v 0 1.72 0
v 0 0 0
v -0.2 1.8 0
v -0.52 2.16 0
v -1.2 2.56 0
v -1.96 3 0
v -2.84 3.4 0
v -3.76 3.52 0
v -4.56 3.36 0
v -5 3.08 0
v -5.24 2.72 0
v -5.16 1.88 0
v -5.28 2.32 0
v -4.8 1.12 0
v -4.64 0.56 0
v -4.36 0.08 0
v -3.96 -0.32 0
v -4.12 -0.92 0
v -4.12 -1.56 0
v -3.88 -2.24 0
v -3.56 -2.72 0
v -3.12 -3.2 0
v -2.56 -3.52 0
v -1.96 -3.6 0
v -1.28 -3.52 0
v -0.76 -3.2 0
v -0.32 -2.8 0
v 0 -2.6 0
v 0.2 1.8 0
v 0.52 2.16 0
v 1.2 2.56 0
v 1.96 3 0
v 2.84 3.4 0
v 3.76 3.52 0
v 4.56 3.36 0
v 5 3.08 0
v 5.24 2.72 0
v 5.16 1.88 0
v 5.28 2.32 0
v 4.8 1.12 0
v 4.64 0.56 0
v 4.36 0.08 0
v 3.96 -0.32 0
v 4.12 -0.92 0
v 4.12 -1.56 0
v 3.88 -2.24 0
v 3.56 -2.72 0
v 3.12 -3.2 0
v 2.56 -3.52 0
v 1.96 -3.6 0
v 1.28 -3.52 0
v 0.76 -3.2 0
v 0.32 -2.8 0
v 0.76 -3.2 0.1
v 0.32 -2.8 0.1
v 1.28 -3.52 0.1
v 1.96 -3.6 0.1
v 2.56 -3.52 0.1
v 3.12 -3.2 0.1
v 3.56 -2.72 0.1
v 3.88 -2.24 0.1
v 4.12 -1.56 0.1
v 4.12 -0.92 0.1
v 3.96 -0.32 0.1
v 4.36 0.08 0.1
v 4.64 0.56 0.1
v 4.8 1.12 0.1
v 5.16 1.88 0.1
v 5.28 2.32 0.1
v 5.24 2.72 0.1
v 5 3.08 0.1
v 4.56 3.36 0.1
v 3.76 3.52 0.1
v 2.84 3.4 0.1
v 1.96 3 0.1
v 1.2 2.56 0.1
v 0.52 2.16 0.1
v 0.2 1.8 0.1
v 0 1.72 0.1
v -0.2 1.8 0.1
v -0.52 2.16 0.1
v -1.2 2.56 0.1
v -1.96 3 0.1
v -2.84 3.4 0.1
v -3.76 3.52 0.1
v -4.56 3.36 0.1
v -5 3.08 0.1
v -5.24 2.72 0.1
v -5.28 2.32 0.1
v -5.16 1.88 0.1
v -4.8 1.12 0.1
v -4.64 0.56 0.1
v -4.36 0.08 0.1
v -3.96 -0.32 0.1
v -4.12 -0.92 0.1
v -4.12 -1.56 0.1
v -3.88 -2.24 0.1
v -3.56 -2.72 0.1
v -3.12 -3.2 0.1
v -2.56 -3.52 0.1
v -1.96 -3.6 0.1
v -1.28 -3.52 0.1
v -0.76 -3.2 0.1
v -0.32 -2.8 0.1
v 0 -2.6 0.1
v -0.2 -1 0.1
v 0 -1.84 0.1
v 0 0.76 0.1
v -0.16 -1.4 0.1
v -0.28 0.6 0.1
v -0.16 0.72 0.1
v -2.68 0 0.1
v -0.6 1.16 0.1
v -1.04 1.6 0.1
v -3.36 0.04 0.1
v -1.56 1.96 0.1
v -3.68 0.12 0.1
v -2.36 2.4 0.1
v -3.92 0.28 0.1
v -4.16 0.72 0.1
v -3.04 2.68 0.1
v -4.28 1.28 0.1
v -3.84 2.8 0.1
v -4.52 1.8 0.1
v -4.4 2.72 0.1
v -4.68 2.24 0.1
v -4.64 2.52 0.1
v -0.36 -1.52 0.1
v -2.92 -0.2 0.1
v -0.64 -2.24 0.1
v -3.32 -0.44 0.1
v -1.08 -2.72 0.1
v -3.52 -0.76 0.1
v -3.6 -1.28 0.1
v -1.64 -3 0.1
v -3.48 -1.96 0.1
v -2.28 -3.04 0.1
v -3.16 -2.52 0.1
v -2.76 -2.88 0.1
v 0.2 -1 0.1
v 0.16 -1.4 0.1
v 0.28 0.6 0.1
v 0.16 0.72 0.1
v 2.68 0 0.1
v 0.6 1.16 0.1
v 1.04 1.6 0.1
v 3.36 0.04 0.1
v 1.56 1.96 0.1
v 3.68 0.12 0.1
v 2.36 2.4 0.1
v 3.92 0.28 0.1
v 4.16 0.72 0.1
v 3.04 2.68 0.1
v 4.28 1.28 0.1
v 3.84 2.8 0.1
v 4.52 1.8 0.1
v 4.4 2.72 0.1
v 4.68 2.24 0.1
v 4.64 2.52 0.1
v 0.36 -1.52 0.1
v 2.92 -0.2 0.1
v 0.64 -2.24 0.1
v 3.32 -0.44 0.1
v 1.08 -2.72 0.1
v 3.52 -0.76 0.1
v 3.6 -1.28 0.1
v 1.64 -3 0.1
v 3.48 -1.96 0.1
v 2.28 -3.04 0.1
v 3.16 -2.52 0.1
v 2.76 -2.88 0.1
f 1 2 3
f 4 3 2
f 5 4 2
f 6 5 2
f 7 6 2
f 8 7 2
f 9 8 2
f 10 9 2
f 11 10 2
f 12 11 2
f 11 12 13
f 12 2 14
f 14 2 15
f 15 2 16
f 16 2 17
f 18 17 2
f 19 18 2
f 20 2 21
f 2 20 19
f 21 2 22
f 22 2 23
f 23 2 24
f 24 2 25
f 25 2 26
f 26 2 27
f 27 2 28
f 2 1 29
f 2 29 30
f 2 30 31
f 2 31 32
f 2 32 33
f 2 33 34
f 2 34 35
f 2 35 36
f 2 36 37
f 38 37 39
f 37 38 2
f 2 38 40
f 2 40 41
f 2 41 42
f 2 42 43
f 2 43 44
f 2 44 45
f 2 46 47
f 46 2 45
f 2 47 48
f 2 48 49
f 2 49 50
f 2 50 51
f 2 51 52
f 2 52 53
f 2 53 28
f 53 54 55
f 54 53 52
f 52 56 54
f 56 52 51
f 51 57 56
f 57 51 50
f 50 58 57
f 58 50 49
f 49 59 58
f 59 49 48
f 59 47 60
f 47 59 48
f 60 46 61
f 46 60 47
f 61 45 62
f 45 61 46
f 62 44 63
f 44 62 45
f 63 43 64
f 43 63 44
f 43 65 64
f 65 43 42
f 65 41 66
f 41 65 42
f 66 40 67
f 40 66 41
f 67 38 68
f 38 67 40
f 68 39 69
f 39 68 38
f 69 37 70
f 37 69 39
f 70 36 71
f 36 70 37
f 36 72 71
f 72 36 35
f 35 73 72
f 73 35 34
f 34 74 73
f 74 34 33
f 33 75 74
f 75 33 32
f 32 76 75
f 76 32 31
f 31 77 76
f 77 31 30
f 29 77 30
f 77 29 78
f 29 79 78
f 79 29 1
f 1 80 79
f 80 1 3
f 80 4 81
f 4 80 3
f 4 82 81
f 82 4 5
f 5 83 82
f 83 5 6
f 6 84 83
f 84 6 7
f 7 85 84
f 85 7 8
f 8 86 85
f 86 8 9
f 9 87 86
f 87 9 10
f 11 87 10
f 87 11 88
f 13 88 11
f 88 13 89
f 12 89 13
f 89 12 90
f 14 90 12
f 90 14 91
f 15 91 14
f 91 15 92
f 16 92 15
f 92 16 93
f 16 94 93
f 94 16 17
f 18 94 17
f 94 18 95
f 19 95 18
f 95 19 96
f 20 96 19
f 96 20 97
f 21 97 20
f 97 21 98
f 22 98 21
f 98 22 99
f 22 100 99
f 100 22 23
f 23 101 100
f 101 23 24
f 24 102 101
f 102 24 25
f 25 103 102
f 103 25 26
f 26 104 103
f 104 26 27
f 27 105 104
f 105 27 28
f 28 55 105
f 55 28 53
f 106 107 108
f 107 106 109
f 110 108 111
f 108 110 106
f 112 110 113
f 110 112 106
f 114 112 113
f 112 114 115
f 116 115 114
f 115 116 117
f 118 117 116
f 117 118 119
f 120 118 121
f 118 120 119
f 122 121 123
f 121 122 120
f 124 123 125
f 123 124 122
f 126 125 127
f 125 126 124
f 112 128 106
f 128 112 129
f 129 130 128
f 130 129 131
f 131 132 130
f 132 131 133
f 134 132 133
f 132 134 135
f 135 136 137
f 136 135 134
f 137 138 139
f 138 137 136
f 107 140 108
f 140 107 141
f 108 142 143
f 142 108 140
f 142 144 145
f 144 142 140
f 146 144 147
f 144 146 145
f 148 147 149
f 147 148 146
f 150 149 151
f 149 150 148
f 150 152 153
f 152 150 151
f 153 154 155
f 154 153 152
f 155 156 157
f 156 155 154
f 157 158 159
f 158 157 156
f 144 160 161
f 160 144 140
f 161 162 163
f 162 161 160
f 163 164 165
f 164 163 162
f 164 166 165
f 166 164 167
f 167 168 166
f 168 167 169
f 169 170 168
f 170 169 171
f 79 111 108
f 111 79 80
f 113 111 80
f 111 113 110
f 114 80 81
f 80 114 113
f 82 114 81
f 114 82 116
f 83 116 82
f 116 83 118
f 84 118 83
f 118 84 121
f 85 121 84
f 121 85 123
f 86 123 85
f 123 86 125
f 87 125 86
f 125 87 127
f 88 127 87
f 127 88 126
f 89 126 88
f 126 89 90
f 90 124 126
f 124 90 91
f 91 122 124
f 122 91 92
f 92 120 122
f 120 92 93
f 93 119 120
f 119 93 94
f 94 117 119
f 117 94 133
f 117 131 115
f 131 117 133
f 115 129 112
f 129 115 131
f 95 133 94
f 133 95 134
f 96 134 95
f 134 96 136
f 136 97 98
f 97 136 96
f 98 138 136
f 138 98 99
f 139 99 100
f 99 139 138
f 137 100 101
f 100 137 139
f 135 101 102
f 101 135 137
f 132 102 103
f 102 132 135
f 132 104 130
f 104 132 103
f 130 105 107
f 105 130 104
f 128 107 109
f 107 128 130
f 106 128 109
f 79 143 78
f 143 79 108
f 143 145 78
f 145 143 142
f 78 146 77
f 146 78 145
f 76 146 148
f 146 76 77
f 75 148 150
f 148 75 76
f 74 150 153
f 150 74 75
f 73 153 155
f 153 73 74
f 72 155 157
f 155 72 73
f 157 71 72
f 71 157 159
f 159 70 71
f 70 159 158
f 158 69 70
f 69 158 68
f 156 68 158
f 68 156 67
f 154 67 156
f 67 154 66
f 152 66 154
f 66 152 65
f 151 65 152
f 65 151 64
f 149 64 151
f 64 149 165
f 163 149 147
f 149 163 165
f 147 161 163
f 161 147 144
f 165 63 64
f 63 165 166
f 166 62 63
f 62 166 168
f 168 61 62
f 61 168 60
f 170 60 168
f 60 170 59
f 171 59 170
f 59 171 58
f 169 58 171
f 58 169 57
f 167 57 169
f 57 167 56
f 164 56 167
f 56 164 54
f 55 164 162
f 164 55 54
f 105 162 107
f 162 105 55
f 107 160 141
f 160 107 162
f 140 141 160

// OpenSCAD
// file: s/4650854is02.scad
use <../../lib.scad>
function ldraw_lib__s__4650854is02() = [
// 0 ~Sticker  0.9 x  1.3 with Butterfly - Shape
// 0 Name: s\4650854is02.dat
// 0 Author: Takeshi Takahashi [RainbowDolphin]
// 0 !LDRAW_ORG Subpart UPDATE 2024-04
// 0 !LICENSE Licensed under CC BY 4.0 : see CAreadme.txt
// 
// 0 BFC CERTIFY CCW
  [0,"BFC","CERTIFY"],
  [0,"BFC","CCW"],
// 
// 0 !HISTORY 2024-05-28 [OrionP] Official Update 2024-04
// 
// 
// 4 16 -.5 -.25 -2.5 -.4 -.25 -3.5 0 -.25 -4.6 0 -.25 1.9
  [4,16,-.5,-.25,-2.5,-.4,-.25,-3.5,0,-.25,-4.6,0,-.25,1.9],
// 4 16 -.5 -.25 -2.5 0 -.25 1.9 -.4 -.25 1.8 -.7 -.25 1.5
  [4,16,-.5,-.25,-2.5,0,-.25,1.9,-.4,-.25,1.8,-.7,-.25,1.5],
// 4 16 -6.7 -.25 0 -.5 -.25 -2.5 -.7 -.25 1.5 -1.5 -.25 2.9
  [4,16,-6.7,-.25,0,-.5,-.25,-2.5,-.7,-.25,1.5,-1.5,-.25,2.9],
// 4 16 -8.4 -.25 .1 -6.7 -.25 0 -1.5 -.25 2.9 -2.6 -.25 4
  [4,16,-8.4,-.25,.1,-6.7,-.25,0,-1.5,-.25,2.9,-2.6,-.25,4],
// 4 16 -9.2 -.25 .3 -8.4 -.25 .1 -2.6 -.25 4 -3.9 -.25 4.9
  [4,16,-9.2,-.25,.3,-8.4,-.25,.1,-2.6,-.25,4,-3.9,-.25,4.9],
// 4 16 -9.8 -.25 .7 -9.2 -.25 .3 -3.9 -.25 4.9 -5.9 -.25 6
  [4,16,-9.8,-.25,.7,-9.2,-.25,.3,-3.9,-.25,4.9,-5.9,-.25,6],
// 4 16 -10.4 -.25 1.8 -9.8 -.25 .7 -5.9 -.25 6 -7.6 -.25 6.7
  [4,16,-10.4,-.25,1.8,-9.8,-.25,.7,-5.9,-.25,6,-7.6,-.25,6.7],
// 4 16 -10.7 -.25 3.2 -10.4 -.25 1.8 -7.6 -.25 6.7 -9.6 -.25 7
  [4,16,-10.7,-.25,3.2,-10.4,-.25,1.8,-7.6,-.25,6.7,-9.6,-.25,7],
// 4 16 -11.3 -.25 4.5 -10.7 -.25 3.2 -9.6 -.25 7 -11 -.25 6.8
  [4,16,-11.3,-.25,4.5,-10.7,-.25,3.2,-9.6,-.25,7,-11,-.25,6.8],
// 4 16 -11.7 -.25 5.6 -11.3 -.25 4.5 -11 -.25 6.8 -11.6 -.25 6.3
  [4,16,-11.7,-.25,5.6,-11.3,-.25,4.5,-11,-.25,6.8,-11.6,-.25,6.3],
// 4 16 -.5 -.25 -2.5 -6.7 -.25 0 -7.3 -.25 -.5 -.9 -.25 -3.8
  [4,16,-.5,-.25,-2.5,-6.7,-.25,0,-7.3,-.25,-.5,-.9,-.25,-3.8],
// 4 16 -.9 -.25 -3.8 -7.3 -.25 -.5 -8.3 -.25 -1.1 -1.6 -.25 -5.6
  [4,16,-.9,-.25,-3.8,-7.3,-.25,-.5,-8.3,-.25,-1.1,-1.6,-.25,-5.6],
// 4 16 -1.6 -.25 -5.6 -8.3 -.25 -1.1 -8.8 -.25 -1.9 -2.7 -.25 -6.8
  [4,16,-1.6,-.25,-5.6,-8.3,-.25,-1.1,-8.8,-.25,-1.9,-2.7,-.25,-6.8],
// 4 16 -2.7 -.25 -6.8 -8.8 -.25 -1.9 -9 -.25 -3.2 -4.1 -.25 -7.5
  [4,16,-2.7,-.25,-6.8,-8.8,-.25,-1.9,-9,-.25,-3.2,-4.1,-.25,-7.5],
// 4 16 -4.1 -.25 -7.5 -9 -.25 -3.2 -8.7 -.25 -4.9 -5.7 -.25 -7.6
  [4,16,-4.1,-.25,-7.5,-9,-.25,-3.2,-8.7,-.25,-4.9,-5.7,-.25,-7.6],
// 4 16 -5.7 -.25 -7.6 -8.7 -.25 -4.9 -7.9 -.25 -6.3 -6.9 -.25 -7.2
  [4,16,-5.7,-.25,-7.6,-8.7,-.25,-4.9,-7.9,-.25,-6.3,-6.9,-.25,-7.2],
// 4 16 0 -.25 -4.6 .4 -.25 -3.5 .5 -.25 -2.5 0 -.25 1.9
  [4,16,0,-.25,-4.6,.4,-.25,-3.5,.5,-.25,-2.5,0,-.25,1.9],
// 4 16 .4 -.25 1.8 0 -.25 1.9 .5 -.25 -2.5 .7 -.25 1.5
  [4,16,.4,-.25,1.8,0,-.25,1.9,.5,-.25,-2.5,.7,-.25,1.5],
// 4 16 .7 -.25 1.5 .5 -.25 -2.5 6.7 -.25 0 1.5 -.25 2.9
  [4,16,.7,-.25,1.5,.5,-.25,-2.5,6.7,-.25,0,1.5,-.25,2.9],
// 4 16 1.5 -.25 2.9 6.7 -.25 0 8.4 -.25 .1 2.6 -.25 4
  [4,16,1.5,-.25,2.9,6.7,-.25,0,8.4,-.25,.1,2.6,-.25,4],
// 4 16 2.6 -.25 4 8.4 -.25 .1 9.2 -.25 .3 3.9 -.25 4.9
  [4,16,2.6,-.25,4,8.4,-.25,.1,9.2,-.25,.3,3.9,-.25,4.9],
// 4 16 3.9 -.25 4.9 9.2 -.25 .3 9.8 -.25 .7 5.9 -.25 6
  [4,16,3.9,-.25,4.9,9.2,-.25,.3,9.8,-.25,.7,5.9,-.25,6],
// 4 16 5.9 -.25 6 9.8 -.25 .7 10.4 -.25 1.8 7.6 -.25 6.7
  [4,16,5.9,-.25,6,9.8,-.25,.7,10.4,-.25,1.8,7.6,-.25,6.7],
// 4 16 7.6 -.25 6.7 10.4 -.25 1.8 10.7 -.25 3.2 9.6 -.25 7
  [4,16,7.6,-.25,6.7,10.4,-.25,1.8,10.7,-.25,3.2,9.6,-.25,7],
// 4 16 9.6 -.25 7 10.7 -.25 3.2 11.3 -.25 4.5 11 -.25 6.8
  [4,16,9.6,-.25,7,10.7,-.25,3.2,11.3,-.25,4.5,11,-.25,6.8],
// 4 16 11 -.25 6.8 11.3 -.25 4.5 11.7 -.25 5.6 11.6 -.25 6.3
  [4,16,11,-.25,6.8,11.3,-.25,4.5,11.7,-.25,5.6,11.6,-.25,6.3],
// 4 16 7.3 -.25 -.5 6.7 -.25 0 .5 -.25 -2.5 .9 -.25 -3.8
  [4,16,7.3,-.25,-.5,6.7,-.25,0,.5,-.25,-2.5,.9,-.25,-3.8],
// 4 16 8.3 -.25 -1.1 7.3 -.25 -.5 .9 -.25 -3.8 1.6 -.25 -5.6
  [4,16,8.3,-.25,-1.1,7.3,-.25,-.5,.9,-.25,-3.8,1.6,-.25,-5.6],
// 4 16 8.8 -.25 -1.9 8.3 -.25 -1.1 1.6 -.25 -5.6 2.7 -.25 -6.8
  [4,16,8.8,-.25,-1.9,8.3,-.25,-1.1,1.6,-.25,-5.6,2.7,-.25,-6.8],
// 4 16 9 -.25 -3.2 8.8 -.25 -1.9 2.7 -.25 -6.8 4.1 -.25 -7.5
  [4,16,9,-.25,-3.2,8.8,-.25,-1.9,2.7,-.25,-6.8,4.1,-.25,-7.5],
// 4 16 8.7 -.25 -4.9 9 -.25 -3.2 4.1 -.25 -7.5 5.7 -.25 -7.6
  [4,16,8.7,-.25,-4.9,9,-.25,-3.2,4.1,-.25,-7.5,5.7,-.25,-7.6],
// 4 16 7.9 -.25 -6.3 8.7 -.25 -4.9 5.7 -.25 -7.6 6.9 -.25 -7.2
  [4,16,7.9,-.25,-6.3,8.7,-.25,-4.9,5.7,-.25,-7.6,6.9,-.25,-7.2],
];
module ldraw_lib__s__4650854is02(step=0, col=false, unit=2/5, alt=false, line=0.2, solid=!$preview)
    makepoly(ldraw_lib__s__4650854is02(), step=step, col=col, unit=unit, alt=alt, line=line, solid=solid);
ldraw_lib__s__4650854is02(line=0.2);
// main file
use <../lib.scad>
use <s/4650854is01.scad>
use <s/4650854is02.scad>
use <s/4650854is03.scad>
function ldraw_lib__4650854i() = [
// 0 Sticker  0.9 x  1.3 with Medium Blue Butterfly
// 0 Name: 4650854i.dat
// 0 Author: Takeshi Takahashi [RainbowDolphin]
// 0 !LDRAW_ORG Part UPDATE 2024-04
// 0 !LICENSE Licensed under CC BY 4.0 : see CAreadme.txt
// 
// 0 BFC CERTIFY CCW
  [0,"BFC","CERTIFY"],
  [0,"BFC","CCW"],
// 
// 0 !KEYWORDS camp, Riding, Set 3185, Stable
// 
// 0 !HISTORY 2024-05-28 [OrionP] Official Update 2024-04
// 
// 
// 1 16 0 0 0 1 0 0 0 1 0 0 0 1 s\4650854is01.dat
  [1,16,0,0,0,1,0,0,0,1,0,0,0,1, ldraw_lib__s__4650854is01()],
// 1 73 0 0 0 1 0 0 0 1 0 0 0 1 s\4650854is02.dat
  [1,73,0,0,0,1,0,0,0,1,0,0,0,1, ldraw_lib__s__4650854is02()],
// 1 5 0 0 0 1 0 0 0 1 0 0 0 1 s\4650854is03.dat
  [1,5,0,0,0,1,0,0,0,1,0,0,0,1, ldraw_lib__s__4650854is03()],
];
module ldraw_lib__4650854i(step=0, col=false, unit=2/5, alt=false, line=0.2, solid=!$preview)
    makepoly(ldraw_lib__4650854i(), step=step, col=col, unit=unit, alt=alt, line=line, solid=solid);
ldraw_lib__4650854i(line=0.2);
